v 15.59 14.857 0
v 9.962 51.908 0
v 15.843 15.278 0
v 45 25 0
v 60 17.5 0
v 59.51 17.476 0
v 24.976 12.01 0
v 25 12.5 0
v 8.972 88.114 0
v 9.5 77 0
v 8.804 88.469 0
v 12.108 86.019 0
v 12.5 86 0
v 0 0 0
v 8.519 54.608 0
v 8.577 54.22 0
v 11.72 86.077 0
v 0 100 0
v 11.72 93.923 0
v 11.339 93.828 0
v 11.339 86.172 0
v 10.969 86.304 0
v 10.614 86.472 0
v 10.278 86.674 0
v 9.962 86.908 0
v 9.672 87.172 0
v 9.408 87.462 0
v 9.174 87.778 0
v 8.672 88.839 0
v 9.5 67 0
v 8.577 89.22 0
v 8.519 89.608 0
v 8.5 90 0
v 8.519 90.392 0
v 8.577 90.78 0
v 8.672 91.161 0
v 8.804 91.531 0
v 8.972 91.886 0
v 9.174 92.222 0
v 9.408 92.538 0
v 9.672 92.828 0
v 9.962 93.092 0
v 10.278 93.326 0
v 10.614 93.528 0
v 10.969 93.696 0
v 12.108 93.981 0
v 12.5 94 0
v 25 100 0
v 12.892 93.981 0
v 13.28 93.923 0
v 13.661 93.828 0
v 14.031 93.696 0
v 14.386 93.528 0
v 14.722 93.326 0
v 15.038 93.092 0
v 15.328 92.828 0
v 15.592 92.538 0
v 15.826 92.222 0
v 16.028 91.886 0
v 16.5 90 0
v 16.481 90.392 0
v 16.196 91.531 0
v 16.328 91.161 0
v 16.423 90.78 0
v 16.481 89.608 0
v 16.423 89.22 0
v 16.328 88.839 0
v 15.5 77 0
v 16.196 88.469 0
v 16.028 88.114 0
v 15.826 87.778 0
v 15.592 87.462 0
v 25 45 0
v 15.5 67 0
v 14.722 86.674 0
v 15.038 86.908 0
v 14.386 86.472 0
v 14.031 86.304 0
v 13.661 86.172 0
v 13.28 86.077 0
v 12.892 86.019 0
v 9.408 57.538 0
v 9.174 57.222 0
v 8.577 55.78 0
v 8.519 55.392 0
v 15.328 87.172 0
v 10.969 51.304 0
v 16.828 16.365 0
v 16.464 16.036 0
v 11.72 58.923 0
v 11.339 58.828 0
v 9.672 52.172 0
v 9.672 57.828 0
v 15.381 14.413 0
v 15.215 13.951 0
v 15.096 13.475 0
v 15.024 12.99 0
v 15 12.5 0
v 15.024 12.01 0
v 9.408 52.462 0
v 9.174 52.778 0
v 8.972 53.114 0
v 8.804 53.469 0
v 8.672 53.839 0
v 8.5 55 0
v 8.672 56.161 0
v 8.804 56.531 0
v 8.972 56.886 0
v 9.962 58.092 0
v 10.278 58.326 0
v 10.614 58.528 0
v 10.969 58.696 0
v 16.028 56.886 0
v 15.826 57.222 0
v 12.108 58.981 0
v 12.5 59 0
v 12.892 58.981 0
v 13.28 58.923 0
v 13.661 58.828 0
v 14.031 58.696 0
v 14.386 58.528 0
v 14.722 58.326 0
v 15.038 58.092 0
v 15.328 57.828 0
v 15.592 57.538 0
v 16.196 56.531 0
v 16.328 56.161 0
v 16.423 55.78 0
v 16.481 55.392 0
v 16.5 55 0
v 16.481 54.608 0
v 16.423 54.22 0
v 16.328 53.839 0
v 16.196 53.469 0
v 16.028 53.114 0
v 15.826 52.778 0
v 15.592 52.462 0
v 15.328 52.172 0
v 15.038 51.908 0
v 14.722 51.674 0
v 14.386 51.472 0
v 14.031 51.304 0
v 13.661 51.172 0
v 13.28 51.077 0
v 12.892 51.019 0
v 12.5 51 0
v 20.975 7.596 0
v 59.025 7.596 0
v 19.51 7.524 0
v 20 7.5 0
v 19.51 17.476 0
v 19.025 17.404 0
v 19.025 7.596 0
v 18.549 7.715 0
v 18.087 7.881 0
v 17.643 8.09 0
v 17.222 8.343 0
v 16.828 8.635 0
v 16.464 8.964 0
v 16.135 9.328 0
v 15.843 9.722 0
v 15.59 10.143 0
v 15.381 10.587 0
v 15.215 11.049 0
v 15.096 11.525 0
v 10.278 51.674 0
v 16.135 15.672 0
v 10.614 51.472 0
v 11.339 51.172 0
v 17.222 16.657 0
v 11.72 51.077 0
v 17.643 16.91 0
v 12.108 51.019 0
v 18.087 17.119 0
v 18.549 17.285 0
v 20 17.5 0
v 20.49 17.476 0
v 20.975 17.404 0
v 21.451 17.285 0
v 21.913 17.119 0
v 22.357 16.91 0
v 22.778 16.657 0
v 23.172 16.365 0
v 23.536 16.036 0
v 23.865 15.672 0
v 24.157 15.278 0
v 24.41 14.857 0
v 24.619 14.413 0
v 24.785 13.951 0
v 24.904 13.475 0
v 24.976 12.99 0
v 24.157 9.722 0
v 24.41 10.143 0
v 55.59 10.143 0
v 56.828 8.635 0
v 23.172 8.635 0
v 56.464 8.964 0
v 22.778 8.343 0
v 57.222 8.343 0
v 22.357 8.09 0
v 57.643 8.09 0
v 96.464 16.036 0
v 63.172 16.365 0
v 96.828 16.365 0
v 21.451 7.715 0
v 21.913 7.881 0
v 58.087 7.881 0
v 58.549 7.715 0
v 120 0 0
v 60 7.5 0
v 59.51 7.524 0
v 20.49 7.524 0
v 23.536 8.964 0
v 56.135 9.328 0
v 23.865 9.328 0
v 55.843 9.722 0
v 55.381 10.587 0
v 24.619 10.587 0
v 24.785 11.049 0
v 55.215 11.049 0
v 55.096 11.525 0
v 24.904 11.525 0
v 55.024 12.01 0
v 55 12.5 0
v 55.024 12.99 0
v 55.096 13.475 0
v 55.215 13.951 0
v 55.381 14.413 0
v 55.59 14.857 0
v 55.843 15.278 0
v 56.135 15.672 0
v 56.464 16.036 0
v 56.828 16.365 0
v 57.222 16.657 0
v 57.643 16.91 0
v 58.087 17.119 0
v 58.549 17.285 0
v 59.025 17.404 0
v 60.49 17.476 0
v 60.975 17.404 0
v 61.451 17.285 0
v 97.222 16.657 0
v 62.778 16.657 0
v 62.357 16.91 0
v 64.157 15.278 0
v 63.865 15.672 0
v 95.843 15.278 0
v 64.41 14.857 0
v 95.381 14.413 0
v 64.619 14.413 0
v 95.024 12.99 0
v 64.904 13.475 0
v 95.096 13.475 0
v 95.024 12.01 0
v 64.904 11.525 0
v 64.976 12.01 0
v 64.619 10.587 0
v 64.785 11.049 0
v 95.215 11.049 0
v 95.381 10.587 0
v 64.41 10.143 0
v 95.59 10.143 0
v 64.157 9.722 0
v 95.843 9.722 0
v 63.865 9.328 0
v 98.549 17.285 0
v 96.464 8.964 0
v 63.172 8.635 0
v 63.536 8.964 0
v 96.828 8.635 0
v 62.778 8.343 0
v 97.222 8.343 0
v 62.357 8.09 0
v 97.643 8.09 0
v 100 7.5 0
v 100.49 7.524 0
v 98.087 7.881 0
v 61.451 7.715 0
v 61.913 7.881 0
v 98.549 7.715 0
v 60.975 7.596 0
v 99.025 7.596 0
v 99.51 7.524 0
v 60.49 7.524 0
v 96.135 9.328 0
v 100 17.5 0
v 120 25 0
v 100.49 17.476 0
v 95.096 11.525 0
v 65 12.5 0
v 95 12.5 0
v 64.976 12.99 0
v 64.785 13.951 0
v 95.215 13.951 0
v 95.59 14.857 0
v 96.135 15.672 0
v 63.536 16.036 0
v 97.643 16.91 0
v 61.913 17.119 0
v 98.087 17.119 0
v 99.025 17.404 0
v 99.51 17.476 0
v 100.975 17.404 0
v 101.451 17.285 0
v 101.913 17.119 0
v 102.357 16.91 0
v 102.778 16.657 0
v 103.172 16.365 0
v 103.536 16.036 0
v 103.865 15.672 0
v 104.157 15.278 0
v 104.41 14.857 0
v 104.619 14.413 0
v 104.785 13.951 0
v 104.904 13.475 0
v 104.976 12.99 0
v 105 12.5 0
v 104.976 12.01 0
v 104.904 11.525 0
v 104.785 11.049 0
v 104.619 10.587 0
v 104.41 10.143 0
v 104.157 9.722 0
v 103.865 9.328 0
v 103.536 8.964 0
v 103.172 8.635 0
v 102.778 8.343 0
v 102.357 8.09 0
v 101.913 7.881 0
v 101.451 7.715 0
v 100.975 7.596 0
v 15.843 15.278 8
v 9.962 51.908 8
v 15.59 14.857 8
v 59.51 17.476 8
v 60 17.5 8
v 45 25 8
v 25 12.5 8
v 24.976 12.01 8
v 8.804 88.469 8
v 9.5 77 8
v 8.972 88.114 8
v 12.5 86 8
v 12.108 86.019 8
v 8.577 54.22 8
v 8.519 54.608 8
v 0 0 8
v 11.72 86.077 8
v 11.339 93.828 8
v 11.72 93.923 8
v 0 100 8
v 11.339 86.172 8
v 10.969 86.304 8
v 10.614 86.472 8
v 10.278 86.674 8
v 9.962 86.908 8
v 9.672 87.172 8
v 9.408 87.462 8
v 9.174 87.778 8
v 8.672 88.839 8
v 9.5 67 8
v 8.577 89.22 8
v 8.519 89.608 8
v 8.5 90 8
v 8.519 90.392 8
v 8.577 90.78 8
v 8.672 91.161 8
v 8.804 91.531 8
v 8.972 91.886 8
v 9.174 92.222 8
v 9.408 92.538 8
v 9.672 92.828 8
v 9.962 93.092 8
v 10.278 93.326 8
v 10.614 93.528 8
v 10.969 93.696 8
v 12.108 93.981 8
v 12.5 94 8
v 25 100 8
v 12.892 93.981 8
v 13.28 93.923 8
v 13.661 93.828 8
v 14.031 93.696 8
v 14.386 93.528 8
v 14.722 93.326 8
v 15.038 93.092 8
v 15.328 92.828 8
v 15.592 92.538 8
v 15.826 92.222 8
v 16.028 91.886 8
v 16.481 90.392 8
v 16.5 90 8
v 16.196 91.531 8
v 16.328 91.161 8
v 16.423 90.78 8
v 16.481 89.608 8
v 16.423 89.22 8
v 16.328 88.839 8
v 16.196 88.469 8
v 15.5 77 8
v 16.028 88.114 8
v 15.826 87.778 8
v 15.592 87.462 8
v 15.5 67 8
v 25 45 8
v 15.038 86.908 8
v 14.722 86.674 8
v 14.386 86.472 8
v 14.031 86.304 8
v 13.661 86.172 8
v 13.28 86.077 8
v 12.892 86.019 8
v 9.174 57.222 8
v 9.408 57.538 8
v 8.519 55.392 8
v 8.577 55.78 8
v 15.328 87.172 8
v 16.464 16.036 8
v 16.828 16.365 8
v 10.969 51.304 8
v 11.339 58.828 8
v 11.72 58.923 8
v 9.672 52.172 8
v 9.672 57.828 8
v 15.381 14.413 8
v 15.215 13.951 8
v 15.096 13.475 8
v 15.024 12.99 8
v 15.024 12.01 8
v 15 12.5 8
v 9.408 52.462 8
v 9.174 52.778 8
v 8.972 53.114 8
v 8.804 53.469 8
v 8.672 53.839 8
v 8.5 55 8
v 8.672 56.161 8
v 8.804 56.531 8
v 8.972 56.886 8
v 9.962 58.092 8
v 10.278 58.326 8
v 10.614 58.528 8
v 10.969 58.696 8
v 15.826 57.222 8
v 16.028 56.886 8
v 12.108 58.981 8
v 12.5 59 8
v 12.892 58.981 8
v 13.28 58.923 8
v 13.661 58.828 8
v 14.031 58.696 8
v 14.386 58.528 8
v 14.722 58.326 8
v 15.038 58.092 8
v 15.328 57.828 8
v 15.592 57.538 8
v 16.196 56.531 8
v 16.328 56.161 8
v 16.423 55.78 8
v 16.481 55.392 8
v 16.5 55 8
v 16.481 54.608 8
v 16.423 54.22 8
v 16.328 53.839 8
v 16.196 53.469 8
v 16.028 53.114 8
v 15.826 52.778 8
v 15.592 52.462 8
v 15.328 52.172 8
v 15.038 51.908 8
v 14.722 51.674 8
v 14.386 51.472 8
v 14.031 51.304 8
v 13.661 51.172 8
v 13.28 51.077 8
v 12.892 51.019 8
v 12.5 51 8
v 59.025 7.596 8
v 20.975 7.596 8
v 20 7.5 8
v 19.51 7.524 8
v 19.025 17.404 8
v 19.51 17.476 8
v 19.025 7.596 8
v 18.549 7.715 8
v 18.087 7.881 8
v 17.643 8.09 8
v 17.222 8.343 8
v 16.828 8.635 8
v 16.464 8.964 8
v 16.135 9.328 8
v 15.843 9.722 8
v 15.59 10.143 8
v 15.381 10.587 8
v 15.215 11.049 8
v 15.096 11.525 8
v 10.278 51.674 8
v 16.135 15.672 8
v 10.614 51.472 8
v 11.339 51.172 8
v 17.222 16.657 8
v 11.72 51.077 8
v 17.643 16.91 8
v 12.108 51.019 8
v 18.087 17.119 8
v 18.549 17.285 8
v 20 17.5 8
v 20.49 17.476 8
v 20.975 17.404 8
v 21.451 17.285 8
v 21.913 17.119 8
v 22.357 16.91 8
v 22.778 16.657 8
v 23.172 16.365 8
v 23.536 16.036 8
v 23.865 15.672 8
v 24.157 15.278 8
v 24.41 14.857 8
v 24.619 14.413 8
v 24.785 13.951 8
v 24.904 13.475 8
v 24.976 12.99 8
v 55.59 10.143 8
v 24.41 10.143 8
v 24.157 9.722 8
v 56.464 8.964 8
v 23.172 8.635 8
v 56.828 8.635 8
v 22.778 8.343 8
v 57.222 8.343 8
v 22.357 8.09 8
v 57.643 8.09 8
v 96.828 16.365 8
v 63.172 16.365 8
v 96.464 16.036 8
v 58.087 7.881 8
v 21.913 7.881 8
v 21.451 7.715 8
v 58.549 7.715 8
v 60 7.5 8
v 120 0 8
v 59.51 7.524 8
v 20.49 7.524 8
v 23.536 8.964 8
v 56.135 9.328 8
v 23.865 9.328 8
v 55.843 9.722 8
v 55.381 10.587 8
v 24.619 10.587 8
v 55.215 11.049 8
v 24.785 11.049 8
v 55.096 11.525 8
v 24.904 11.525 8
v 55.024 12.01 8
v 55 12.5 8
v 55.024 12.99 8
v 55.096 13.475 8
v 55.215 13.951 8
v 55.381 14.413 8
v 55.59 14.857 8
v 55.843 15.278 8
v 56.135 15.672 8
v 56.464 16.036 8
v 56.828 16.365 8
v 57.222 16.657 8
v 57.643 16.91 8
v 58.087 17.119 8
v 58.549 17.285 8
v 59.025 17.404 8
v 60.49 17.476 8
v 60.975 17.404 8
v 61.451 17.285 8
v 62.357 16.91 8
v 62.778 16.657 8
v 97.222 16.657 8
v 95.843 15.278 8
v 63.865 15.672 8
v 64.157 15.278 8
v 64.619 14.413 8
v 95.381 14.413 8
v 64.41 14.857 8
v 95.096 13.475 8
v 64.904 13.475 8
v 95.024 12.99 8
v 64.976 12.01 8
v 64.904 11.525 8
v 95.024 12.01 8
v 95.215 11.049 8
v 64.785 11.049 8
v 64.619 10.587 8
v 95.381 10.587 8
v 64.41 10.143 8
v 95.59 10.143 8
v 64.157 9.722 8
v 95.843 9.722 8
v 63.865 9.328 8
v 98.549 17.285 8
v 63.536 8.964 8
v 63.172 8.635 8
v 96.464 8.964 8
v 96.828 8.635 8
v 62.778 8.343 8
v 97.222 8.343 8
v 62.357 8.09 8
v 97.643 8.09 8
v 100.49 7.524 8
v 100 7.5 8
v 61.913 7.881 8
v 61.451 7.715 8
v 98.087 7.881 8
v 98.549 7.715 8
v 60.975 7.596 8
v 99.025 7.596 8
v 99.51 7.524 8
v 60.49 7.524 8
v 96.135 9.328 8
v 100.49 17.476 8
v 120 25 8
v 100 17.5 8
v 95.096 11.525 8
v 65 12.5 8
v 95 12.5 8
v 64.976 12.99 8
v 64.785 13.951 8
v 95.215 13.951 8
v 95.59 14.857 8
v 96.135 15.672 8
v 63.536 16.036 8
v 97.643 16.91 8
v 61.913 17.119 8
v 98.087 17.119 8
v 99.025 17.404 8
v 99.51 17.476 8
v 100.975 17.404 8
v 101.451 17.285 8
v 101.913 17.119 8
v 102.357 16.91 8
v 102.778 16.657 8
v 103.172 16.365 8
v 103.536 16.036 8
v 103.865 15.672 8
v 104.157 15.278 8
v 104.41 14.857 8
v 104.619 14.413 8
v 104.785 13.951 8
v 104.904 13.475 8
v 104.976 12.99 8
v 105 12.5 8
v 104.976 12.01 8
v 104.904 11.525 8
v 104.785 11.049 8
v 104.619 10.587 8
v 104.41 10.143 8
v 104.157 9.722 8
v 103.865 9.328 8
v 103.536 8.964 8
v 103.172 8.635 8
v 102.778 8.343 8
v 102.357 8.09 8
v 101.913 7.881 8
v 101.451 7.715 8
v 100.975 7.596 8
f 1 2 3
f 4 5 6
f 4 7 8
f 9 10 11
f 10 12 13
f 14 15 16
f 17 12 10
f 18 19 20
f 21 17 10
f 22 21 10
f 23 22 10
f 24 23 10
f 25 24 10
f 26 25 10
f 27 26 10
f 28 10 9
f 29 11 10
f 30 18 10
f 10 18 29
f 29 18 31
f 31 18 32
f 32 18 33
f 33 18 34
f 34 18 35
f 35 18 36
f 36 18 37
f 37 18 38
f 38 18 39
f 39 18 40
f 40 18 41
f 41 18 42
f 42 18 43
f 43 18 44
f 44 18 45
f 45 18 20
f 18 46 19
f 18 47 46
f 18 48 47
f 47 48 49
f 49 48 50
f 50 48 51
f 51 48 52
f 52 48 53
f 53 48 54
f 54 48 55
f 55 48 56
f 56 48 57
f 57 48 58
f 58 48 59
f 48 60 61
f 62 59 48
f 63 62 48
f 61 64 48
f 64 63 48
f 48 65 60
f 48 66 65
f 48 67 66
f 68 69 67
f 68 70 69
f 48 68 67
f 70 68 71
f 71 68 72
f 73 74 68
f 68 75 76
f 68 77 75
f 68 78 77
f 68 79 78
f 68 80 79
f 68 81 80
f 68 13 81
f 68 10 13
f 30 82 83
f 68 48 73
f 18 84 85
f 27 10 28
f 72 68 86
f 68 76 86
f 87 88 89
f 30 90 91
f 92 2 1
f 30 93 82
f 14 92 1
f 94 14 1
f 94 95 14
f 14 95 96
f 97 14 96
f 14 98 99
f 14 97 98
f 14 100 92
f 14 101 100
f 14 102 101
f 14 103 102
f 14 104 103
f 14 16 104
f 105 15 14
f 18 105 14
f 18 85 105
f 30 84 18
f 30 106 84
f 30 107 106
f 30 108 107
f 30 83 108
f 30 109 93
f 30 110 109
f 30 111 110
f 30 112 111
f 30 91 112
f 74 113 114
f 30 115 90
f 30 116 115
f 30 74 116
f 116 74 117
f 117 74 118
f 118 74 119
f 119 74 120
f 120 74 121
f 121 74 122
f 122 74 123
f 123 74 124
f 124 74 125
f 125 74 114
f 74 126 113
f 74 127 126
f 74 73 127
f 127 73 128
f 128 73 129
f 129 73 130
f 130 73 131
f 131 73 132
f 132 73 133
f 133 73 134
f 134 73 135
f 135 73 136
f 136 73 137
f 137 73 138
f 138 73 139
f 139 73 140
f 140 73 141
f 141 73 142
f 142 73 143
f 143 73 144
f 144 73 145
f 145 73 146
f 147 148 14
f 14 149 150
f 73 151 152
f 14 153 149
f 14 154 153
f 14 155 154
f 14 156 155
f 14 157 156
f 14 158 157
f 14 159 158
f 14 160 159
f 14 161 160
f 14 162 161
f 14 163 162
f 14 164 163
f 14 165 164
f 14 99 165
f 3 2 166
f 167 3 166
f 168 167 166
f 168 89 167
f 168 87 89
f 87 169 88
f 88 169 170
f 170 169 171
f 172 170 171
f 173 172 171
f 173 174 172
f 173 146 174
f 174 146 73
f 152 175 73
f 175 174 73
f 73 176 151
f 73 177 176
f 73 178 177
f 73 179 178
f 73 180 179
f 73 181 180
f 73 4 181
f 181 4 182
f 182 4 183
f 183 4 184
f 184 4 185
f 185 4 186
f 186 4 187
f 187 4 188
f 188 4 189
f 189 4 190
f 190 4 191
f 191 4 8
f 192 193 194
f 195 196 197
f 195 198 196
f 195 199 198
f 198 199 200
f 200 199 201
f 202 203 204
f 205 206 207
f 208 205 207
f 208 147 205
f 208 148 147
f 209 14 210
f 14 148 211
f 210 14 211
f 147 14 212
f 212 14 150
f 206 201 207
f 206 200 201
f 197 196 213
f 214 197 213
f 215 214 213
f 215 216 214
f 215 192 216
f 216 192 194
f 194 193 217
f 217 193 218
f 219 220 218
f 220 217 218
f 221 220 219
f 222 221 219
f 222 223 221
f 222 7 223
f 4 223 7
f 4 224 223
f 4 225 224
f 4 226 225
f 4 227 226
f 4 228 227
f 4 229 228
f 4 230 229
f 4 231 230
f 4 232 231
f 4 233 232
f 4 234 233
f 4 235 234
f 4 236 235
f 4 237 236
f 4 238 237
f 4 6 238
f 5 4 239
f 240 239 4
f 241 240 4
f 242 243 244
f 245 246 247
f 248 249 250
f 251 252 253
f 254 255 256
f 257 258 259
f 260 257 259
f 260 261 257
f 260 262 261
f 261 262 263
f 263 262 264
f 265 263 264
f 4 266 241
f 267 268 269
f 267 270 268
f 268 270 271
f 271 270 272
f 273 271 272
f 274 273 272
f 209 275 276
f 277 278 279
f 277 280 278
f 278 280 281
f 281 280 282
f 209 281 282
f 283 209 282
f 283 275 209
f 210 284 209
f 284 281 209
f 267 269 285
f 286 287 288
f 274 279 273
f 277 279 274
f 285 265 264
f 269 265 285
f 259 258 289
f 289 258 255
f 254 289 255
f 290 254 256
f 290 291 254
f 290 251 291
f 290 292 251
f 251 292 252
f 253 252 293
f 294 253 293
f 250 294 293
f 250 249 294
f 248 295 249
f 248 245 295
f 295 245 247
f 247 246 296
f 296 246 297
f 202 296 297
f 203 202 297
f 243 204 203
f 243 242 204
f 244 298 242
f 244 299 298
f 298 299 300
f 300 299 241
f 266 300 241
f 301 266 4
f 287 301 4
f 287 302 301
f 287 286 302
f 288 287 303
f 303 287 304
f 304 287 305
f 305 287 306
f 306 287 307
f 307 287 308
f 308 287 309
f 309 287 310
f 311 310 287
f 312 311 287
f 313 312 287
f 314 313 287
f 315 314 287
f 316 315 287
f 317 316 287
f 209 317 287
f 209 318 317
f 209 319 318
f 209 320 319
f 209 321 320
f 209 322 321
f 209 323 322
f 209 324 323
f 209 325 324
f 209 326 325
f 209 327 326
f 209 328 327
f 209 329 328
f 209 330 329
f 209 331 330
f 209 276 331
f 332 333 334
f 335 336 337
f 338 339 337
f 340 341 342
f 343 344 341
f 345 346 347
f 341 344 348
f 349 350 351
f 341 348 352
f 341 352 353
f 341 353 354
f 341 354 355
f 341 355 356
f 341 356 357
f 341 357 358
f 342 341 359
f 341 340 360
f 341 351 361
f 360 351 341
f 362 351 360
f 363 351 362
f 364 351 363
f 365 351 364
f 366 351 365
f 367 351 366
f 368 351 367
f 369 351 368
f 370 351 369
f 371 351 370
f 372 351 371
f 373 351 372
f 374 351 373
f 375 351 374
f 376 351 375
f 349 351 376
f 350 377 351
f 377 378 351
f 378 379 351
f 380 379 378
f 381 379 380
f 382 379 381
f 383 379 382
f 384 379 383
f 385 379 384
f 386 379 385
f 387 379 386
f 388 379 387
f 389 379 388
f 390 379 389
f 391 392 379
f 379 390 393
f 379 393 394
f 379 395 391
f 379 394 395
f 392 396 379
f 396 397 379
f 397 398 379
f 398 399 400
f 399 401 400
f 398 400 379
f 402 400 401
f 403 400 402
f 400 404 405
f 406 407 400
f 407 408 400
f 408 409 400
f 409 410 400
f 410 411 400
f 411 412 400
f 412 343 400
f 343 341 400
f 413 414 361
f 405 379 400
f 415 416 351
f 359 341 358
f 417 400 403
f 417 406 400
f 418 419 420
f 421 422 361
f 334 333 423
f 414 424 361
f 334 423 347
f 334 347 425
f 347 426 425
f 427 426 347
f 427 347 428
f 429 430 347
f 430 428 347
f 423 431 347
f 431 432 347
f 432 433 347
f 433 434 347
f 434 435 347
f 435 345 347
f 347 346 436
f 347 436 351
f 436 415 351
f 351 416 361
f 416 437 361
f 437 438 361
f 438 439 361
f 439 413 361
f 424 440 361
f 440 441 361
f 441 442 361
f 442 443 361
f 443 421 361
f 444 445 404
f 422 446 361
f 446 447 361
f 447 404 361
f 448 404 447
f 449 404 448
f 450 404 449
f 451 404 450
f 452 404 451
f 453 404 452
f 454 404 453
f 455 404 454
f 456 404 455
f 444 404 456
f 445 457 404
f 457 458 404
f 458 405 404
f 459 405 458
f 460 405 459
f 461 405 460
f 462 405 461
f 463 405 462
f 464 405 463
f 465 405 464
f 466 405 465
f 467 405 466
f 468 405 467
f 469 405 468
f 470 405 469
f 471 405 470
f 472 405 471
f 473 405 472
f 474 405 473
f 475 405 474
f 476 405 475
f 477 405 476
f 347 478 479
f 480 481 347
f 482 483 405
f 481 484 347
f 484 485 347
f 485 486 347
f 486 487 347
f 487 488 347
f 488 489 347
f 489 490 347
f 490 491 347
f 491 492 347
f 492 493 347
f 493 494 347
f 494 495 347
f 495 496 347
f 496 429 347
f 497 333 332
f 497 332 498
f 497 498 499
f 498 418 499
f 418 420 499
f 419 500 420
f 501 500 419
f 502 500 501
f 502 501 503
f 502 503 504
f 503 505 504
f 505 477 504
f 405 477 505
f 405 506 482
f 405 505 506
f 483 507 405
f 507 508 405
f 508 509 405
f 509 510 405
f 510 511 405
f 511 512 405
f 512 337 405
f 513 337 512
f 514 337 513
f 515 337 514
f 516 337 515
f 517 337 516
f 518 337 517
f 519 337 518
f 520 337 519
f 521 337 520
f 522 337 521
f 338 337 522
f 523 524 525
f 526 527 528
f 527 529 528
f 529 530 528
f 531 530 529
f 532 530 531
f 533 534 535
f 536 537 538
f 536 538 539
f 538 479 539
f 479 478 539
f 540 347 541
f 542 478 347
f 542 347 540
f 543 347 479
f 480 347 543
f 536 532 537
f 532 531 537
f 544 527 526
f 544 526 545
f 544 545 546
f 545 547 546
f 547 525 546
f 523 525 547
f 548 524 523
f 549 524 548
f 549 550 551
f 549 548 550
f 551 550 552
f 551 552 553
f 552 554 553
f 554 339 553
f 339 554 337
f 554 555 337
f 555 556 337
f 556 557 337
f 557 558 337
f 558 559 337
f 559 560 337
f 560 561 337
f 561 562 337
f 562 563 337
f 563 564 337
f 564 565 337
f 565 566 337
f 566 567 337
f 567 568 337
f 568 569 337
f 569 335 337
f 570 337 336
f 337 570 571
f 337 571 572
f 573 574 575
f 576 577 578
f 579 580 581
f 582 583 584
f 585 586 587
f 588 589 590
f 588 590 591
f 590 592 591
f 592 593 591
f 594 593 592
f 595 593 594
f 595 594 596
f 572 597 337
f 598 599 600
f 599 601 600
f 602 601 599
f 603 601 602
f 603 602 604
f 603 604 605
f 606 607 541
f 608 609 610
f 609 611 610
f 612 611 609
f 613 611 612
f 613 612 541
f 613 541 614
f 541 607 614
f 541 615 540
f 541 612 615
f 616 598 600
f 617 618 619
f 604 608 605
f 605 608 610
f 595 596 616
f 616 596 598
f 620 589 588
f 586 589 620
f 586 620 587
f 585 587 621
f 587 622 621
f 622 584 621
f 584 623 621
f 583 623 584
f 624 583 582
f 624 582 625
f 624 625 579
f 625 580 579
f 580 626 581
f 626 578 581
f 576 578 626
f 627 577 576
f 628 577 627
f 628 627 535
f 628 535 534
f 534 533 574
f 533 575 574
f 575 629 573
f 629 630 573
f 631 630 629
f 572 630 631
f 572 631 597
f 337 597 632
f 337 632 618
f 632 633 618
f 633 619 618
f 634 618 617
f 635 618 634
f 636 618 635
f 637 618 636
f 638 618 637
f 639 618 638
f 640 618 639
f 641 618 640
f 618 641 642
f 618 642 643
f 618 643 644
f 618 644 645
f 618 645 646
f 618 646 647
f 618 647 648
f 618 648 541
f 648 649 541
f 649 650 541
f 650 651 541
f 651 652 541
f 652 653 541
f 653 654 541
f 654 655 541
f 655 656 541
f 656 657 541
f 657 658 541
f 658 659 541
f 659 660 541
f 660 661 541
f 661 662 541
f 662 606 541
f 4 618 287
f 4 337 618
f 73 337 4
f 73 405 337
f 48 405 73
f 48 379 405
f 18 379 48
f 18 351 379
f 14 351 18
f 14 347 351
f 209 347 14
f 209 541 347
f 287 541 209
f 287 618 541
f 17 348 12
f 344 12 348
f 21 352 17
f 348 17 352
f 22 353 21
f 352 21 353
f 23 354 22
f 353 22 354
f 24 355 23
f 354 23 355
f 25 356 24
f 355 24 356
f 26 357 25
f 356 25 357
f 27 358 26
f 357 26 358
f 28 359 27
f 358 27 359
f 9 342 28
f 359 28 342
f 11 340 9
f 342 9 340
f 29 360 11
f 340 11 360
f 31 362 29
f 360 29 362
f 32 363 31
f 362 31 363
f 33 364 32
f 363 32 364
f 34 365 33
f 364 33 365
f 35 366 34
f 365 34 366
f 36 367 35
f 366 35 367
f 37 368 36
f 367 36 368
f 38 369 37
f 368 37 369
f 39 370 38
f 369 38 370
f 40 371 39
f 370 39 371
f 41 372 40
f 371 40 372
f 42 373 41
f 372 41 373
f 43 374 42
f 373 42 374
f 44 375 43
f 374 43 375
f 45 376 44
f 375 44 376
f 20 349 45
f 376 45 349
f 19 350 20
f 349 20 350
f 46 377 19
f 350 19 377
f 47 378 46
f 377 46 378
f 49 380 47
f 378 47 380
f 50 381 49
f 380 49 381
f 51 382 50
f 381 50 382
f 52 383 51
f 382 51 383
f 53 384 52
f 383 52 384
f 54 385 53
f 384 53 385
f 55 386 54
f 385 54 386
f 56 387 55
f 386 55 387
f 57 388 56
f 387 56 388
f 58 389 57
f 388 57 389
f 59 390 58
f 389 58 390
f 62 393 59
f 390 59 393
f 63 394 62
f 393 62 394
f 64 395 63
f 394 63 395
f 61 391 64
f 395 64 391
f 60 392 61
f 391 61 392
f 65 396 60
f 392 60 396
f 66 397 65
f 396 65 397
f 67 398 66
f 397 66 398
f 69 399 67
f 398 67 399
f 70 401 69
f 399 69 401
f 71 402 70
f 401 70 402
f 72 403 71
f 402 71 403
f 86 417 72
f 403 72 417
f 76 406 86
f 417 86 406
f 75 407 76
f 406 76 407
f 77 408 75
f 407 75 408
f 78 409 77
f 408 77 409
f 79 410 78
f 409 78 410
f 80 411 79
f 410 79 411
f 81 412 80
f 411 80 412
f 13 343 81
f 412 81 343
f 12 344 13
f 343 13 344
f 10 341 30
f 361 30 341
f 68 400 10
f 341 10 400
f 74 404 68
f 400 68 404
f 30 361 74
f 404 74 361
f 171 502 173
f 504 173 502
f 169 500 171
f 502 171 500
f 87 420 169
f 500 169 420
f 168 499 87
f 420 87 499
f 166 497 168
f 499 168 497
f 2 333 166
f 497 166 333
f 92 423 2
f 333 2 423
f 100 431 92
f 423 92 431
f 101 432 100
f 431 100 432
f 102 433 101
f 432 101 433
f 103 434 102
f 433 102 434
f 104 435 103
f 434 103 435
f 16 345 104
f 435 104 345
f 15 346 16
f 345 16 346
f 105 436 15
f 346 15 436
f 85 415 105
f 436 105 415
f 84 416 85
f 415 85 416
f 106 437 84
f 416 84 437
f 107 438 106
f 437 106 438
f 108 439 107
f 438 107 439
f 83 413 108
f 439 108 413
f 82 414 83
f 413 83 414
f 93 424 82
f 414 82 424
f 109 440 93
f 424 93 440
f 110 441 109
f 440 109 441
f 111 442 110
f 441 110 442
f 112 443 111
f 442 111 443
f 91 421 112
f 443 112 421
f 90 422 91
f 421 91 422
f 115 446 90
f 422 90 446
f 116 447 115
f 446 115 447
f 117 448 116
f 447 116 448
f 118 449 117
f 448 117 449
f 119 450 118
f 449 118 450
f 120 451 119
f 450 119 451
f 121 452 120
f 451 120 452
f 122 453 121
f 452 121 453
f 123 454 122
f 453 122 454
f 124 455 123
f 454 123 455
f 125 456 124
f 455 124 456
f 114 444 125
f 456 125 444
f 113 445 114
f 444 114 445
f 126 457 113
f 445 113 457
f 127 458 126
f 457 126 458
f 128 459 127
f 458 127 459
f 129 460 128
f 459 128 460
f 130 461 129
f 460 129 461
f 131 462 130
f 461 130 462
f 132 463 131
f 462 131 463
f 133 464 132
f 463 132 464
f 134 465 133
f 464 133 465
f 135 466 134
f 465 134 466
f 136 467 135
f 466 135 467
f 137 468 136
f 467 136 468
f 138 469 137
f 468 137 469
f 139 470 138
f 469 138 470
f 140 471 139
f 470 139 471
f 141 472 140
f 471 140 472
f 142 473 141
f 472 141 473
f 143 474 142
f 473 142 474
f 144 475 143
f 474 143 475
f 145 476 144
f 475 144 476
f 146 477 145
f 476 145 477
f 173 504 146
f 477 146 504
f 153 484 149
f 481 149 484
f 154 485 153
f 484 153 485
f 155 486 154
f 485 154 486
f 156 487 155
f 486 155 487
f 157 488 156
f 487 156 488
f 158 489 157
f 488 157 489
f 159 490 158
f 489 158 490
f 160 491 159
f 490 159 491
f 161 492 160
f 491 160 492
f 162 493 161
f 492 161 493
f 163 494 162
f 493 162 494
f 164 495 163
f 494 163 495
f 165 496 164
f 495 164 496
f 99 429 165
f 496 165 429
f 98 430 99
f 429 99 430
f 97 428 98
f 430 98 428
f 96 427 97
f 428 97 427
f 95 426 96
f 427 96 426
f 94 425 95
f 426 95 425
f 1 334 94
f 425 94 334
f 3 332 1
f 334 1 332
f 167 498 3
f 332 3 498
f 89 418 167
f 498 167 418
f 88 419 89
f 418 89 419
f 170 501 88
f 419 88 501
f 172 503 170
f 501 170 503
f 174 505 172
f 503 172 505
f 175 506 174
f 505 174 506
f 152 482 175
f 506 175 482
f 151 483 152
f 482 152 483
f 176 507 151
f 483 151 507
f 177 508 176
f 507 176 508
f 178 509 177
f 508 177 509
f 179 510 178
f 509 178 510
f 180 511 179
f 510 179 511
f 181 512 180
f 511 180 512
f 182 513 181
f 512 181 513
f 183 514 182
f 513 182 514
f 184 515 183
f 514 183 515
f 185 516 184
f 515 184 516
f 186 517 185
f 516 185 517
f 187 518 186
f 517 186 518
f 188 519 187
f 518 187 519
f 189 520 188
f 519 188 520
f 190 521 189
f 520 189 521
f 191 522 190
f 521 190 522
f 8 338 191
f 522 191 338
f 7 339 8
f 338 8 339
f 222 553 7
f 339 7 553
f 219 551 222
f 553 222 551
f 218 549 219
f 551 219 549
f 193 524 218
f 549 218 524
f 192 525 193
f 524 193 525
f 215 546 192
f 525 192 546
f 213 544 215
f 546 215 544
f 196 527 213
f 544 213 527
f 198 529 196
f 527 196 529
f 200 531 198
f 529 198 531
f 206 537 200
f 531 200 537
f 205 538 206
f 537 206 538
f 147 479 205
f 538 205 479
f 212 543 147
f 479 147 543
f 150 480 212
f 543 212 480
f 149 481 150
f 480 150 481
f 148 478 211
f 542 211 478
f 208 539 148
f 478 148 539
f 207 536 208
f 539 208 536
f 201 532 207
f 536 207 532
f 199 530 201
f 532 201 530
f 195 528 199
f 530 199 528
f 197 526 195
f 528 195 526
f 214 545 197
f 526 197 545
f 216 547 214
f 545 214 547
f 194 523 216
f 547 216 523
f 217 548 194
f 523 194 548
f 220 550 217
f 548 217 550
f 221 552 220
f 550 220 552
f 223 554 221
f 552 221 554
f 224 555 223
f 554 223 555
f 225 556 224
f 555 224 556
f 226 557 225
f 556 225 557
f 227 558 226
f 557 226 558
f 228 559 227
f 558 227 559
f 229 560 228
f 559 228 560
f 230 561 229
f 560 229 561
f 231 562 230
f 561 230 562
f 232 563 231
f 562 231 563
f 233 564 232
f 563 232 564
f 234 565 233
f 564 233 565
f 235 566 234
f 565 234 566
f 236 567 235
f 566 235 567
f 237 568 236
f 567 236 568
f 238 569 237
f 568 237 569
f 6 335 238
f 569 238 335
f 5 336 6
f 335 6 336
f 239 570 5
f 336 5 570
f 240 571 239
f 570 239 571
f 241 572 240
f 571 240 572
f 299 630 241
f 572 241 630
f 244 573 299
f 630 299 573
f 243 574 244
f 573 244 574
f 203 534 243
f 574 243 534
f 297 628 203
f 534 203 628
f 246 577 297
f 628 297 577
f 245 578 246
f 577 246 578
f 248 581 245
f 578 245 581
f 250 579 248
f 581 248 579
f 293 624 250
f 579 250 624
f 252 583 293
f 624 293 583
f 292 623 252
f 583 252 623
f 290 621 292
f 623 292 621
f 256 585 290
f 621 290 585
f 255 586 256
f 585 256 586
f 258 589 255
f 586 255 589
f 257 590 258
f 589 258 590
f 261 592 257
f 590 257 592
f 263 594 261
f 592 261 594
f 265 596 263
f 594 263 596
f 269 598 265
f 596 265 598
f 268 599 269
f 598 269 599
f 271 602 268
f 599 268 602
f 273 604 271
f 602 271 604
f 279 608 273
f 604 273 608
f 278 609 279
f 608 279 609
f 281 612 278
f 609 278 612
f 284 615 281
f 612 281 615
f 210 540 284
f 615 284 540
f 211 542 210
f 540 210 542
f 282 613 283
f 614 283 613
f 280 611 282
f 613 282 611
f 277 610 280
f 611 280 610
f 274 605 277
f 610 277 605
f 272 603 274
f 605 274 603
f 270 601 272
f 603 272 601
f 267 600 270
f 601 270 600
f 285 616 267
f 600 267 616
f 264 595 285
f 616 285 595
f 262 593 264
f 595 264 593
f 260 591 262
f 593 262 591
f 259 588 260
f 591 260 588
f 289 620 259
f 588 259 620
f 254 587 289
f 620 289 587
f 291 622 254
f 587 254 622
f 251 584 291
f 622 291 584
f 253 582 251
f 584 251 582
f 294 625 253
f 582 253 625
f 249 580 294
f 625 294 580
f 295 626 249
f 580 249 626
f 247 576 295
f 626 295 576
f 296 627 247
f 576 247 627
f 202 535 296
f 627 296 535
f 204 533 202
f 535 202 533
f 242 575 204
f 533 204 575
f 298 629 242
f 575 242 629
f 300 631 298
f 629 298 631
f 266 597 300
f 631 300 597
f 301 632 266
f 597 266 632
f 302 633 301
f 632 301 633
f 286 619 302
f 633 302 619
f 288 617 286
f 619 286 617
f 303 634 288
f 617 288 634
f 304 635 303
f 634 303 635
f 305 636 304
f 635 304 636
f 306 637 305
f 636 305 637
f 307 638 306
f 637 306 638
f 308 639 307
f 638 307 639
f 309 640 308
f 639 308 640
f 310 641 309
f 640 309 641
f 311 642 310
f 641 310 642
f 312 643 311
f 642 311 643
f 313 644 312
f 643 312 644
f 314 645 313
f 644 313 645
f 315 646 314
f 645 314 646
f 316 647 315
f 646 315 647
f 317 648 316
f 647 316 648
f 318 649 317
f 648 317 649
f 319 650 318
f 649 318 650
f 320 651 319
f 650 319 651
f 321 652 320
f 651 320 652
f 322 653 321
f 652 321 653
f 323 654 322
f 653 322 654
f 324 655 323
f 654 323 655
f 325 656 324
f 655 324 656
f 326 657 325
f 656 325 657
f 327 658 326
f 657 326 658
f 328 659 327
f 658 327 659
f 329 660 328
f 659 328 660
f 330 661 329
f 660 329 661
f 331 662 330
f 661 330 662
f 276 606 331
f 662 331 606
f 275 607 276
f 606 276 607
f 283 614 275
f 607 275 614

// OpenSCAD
linear_extrude(height = 8)
  difference() {
    polygon([[0,0],[120,0],[120,25],[45,25],[25,45],[25,100],[0,100]]);
    translate([20,12.5]) circle(r = 5, $fn = 64);
    translate([60,12.5]) circle(r = 5, $fn = 64);
    translate([100,12.5]) circle(r = 5, $fn = 64);
    translate([12.5,55]) circle(r = 4, $fn = 64);
    translate([12.5,90]) circle(r = 4, $fn = 64);
    polygon([[9.5,67],[15.5,67],[15.5,77],[9.5,77]]);
  }
